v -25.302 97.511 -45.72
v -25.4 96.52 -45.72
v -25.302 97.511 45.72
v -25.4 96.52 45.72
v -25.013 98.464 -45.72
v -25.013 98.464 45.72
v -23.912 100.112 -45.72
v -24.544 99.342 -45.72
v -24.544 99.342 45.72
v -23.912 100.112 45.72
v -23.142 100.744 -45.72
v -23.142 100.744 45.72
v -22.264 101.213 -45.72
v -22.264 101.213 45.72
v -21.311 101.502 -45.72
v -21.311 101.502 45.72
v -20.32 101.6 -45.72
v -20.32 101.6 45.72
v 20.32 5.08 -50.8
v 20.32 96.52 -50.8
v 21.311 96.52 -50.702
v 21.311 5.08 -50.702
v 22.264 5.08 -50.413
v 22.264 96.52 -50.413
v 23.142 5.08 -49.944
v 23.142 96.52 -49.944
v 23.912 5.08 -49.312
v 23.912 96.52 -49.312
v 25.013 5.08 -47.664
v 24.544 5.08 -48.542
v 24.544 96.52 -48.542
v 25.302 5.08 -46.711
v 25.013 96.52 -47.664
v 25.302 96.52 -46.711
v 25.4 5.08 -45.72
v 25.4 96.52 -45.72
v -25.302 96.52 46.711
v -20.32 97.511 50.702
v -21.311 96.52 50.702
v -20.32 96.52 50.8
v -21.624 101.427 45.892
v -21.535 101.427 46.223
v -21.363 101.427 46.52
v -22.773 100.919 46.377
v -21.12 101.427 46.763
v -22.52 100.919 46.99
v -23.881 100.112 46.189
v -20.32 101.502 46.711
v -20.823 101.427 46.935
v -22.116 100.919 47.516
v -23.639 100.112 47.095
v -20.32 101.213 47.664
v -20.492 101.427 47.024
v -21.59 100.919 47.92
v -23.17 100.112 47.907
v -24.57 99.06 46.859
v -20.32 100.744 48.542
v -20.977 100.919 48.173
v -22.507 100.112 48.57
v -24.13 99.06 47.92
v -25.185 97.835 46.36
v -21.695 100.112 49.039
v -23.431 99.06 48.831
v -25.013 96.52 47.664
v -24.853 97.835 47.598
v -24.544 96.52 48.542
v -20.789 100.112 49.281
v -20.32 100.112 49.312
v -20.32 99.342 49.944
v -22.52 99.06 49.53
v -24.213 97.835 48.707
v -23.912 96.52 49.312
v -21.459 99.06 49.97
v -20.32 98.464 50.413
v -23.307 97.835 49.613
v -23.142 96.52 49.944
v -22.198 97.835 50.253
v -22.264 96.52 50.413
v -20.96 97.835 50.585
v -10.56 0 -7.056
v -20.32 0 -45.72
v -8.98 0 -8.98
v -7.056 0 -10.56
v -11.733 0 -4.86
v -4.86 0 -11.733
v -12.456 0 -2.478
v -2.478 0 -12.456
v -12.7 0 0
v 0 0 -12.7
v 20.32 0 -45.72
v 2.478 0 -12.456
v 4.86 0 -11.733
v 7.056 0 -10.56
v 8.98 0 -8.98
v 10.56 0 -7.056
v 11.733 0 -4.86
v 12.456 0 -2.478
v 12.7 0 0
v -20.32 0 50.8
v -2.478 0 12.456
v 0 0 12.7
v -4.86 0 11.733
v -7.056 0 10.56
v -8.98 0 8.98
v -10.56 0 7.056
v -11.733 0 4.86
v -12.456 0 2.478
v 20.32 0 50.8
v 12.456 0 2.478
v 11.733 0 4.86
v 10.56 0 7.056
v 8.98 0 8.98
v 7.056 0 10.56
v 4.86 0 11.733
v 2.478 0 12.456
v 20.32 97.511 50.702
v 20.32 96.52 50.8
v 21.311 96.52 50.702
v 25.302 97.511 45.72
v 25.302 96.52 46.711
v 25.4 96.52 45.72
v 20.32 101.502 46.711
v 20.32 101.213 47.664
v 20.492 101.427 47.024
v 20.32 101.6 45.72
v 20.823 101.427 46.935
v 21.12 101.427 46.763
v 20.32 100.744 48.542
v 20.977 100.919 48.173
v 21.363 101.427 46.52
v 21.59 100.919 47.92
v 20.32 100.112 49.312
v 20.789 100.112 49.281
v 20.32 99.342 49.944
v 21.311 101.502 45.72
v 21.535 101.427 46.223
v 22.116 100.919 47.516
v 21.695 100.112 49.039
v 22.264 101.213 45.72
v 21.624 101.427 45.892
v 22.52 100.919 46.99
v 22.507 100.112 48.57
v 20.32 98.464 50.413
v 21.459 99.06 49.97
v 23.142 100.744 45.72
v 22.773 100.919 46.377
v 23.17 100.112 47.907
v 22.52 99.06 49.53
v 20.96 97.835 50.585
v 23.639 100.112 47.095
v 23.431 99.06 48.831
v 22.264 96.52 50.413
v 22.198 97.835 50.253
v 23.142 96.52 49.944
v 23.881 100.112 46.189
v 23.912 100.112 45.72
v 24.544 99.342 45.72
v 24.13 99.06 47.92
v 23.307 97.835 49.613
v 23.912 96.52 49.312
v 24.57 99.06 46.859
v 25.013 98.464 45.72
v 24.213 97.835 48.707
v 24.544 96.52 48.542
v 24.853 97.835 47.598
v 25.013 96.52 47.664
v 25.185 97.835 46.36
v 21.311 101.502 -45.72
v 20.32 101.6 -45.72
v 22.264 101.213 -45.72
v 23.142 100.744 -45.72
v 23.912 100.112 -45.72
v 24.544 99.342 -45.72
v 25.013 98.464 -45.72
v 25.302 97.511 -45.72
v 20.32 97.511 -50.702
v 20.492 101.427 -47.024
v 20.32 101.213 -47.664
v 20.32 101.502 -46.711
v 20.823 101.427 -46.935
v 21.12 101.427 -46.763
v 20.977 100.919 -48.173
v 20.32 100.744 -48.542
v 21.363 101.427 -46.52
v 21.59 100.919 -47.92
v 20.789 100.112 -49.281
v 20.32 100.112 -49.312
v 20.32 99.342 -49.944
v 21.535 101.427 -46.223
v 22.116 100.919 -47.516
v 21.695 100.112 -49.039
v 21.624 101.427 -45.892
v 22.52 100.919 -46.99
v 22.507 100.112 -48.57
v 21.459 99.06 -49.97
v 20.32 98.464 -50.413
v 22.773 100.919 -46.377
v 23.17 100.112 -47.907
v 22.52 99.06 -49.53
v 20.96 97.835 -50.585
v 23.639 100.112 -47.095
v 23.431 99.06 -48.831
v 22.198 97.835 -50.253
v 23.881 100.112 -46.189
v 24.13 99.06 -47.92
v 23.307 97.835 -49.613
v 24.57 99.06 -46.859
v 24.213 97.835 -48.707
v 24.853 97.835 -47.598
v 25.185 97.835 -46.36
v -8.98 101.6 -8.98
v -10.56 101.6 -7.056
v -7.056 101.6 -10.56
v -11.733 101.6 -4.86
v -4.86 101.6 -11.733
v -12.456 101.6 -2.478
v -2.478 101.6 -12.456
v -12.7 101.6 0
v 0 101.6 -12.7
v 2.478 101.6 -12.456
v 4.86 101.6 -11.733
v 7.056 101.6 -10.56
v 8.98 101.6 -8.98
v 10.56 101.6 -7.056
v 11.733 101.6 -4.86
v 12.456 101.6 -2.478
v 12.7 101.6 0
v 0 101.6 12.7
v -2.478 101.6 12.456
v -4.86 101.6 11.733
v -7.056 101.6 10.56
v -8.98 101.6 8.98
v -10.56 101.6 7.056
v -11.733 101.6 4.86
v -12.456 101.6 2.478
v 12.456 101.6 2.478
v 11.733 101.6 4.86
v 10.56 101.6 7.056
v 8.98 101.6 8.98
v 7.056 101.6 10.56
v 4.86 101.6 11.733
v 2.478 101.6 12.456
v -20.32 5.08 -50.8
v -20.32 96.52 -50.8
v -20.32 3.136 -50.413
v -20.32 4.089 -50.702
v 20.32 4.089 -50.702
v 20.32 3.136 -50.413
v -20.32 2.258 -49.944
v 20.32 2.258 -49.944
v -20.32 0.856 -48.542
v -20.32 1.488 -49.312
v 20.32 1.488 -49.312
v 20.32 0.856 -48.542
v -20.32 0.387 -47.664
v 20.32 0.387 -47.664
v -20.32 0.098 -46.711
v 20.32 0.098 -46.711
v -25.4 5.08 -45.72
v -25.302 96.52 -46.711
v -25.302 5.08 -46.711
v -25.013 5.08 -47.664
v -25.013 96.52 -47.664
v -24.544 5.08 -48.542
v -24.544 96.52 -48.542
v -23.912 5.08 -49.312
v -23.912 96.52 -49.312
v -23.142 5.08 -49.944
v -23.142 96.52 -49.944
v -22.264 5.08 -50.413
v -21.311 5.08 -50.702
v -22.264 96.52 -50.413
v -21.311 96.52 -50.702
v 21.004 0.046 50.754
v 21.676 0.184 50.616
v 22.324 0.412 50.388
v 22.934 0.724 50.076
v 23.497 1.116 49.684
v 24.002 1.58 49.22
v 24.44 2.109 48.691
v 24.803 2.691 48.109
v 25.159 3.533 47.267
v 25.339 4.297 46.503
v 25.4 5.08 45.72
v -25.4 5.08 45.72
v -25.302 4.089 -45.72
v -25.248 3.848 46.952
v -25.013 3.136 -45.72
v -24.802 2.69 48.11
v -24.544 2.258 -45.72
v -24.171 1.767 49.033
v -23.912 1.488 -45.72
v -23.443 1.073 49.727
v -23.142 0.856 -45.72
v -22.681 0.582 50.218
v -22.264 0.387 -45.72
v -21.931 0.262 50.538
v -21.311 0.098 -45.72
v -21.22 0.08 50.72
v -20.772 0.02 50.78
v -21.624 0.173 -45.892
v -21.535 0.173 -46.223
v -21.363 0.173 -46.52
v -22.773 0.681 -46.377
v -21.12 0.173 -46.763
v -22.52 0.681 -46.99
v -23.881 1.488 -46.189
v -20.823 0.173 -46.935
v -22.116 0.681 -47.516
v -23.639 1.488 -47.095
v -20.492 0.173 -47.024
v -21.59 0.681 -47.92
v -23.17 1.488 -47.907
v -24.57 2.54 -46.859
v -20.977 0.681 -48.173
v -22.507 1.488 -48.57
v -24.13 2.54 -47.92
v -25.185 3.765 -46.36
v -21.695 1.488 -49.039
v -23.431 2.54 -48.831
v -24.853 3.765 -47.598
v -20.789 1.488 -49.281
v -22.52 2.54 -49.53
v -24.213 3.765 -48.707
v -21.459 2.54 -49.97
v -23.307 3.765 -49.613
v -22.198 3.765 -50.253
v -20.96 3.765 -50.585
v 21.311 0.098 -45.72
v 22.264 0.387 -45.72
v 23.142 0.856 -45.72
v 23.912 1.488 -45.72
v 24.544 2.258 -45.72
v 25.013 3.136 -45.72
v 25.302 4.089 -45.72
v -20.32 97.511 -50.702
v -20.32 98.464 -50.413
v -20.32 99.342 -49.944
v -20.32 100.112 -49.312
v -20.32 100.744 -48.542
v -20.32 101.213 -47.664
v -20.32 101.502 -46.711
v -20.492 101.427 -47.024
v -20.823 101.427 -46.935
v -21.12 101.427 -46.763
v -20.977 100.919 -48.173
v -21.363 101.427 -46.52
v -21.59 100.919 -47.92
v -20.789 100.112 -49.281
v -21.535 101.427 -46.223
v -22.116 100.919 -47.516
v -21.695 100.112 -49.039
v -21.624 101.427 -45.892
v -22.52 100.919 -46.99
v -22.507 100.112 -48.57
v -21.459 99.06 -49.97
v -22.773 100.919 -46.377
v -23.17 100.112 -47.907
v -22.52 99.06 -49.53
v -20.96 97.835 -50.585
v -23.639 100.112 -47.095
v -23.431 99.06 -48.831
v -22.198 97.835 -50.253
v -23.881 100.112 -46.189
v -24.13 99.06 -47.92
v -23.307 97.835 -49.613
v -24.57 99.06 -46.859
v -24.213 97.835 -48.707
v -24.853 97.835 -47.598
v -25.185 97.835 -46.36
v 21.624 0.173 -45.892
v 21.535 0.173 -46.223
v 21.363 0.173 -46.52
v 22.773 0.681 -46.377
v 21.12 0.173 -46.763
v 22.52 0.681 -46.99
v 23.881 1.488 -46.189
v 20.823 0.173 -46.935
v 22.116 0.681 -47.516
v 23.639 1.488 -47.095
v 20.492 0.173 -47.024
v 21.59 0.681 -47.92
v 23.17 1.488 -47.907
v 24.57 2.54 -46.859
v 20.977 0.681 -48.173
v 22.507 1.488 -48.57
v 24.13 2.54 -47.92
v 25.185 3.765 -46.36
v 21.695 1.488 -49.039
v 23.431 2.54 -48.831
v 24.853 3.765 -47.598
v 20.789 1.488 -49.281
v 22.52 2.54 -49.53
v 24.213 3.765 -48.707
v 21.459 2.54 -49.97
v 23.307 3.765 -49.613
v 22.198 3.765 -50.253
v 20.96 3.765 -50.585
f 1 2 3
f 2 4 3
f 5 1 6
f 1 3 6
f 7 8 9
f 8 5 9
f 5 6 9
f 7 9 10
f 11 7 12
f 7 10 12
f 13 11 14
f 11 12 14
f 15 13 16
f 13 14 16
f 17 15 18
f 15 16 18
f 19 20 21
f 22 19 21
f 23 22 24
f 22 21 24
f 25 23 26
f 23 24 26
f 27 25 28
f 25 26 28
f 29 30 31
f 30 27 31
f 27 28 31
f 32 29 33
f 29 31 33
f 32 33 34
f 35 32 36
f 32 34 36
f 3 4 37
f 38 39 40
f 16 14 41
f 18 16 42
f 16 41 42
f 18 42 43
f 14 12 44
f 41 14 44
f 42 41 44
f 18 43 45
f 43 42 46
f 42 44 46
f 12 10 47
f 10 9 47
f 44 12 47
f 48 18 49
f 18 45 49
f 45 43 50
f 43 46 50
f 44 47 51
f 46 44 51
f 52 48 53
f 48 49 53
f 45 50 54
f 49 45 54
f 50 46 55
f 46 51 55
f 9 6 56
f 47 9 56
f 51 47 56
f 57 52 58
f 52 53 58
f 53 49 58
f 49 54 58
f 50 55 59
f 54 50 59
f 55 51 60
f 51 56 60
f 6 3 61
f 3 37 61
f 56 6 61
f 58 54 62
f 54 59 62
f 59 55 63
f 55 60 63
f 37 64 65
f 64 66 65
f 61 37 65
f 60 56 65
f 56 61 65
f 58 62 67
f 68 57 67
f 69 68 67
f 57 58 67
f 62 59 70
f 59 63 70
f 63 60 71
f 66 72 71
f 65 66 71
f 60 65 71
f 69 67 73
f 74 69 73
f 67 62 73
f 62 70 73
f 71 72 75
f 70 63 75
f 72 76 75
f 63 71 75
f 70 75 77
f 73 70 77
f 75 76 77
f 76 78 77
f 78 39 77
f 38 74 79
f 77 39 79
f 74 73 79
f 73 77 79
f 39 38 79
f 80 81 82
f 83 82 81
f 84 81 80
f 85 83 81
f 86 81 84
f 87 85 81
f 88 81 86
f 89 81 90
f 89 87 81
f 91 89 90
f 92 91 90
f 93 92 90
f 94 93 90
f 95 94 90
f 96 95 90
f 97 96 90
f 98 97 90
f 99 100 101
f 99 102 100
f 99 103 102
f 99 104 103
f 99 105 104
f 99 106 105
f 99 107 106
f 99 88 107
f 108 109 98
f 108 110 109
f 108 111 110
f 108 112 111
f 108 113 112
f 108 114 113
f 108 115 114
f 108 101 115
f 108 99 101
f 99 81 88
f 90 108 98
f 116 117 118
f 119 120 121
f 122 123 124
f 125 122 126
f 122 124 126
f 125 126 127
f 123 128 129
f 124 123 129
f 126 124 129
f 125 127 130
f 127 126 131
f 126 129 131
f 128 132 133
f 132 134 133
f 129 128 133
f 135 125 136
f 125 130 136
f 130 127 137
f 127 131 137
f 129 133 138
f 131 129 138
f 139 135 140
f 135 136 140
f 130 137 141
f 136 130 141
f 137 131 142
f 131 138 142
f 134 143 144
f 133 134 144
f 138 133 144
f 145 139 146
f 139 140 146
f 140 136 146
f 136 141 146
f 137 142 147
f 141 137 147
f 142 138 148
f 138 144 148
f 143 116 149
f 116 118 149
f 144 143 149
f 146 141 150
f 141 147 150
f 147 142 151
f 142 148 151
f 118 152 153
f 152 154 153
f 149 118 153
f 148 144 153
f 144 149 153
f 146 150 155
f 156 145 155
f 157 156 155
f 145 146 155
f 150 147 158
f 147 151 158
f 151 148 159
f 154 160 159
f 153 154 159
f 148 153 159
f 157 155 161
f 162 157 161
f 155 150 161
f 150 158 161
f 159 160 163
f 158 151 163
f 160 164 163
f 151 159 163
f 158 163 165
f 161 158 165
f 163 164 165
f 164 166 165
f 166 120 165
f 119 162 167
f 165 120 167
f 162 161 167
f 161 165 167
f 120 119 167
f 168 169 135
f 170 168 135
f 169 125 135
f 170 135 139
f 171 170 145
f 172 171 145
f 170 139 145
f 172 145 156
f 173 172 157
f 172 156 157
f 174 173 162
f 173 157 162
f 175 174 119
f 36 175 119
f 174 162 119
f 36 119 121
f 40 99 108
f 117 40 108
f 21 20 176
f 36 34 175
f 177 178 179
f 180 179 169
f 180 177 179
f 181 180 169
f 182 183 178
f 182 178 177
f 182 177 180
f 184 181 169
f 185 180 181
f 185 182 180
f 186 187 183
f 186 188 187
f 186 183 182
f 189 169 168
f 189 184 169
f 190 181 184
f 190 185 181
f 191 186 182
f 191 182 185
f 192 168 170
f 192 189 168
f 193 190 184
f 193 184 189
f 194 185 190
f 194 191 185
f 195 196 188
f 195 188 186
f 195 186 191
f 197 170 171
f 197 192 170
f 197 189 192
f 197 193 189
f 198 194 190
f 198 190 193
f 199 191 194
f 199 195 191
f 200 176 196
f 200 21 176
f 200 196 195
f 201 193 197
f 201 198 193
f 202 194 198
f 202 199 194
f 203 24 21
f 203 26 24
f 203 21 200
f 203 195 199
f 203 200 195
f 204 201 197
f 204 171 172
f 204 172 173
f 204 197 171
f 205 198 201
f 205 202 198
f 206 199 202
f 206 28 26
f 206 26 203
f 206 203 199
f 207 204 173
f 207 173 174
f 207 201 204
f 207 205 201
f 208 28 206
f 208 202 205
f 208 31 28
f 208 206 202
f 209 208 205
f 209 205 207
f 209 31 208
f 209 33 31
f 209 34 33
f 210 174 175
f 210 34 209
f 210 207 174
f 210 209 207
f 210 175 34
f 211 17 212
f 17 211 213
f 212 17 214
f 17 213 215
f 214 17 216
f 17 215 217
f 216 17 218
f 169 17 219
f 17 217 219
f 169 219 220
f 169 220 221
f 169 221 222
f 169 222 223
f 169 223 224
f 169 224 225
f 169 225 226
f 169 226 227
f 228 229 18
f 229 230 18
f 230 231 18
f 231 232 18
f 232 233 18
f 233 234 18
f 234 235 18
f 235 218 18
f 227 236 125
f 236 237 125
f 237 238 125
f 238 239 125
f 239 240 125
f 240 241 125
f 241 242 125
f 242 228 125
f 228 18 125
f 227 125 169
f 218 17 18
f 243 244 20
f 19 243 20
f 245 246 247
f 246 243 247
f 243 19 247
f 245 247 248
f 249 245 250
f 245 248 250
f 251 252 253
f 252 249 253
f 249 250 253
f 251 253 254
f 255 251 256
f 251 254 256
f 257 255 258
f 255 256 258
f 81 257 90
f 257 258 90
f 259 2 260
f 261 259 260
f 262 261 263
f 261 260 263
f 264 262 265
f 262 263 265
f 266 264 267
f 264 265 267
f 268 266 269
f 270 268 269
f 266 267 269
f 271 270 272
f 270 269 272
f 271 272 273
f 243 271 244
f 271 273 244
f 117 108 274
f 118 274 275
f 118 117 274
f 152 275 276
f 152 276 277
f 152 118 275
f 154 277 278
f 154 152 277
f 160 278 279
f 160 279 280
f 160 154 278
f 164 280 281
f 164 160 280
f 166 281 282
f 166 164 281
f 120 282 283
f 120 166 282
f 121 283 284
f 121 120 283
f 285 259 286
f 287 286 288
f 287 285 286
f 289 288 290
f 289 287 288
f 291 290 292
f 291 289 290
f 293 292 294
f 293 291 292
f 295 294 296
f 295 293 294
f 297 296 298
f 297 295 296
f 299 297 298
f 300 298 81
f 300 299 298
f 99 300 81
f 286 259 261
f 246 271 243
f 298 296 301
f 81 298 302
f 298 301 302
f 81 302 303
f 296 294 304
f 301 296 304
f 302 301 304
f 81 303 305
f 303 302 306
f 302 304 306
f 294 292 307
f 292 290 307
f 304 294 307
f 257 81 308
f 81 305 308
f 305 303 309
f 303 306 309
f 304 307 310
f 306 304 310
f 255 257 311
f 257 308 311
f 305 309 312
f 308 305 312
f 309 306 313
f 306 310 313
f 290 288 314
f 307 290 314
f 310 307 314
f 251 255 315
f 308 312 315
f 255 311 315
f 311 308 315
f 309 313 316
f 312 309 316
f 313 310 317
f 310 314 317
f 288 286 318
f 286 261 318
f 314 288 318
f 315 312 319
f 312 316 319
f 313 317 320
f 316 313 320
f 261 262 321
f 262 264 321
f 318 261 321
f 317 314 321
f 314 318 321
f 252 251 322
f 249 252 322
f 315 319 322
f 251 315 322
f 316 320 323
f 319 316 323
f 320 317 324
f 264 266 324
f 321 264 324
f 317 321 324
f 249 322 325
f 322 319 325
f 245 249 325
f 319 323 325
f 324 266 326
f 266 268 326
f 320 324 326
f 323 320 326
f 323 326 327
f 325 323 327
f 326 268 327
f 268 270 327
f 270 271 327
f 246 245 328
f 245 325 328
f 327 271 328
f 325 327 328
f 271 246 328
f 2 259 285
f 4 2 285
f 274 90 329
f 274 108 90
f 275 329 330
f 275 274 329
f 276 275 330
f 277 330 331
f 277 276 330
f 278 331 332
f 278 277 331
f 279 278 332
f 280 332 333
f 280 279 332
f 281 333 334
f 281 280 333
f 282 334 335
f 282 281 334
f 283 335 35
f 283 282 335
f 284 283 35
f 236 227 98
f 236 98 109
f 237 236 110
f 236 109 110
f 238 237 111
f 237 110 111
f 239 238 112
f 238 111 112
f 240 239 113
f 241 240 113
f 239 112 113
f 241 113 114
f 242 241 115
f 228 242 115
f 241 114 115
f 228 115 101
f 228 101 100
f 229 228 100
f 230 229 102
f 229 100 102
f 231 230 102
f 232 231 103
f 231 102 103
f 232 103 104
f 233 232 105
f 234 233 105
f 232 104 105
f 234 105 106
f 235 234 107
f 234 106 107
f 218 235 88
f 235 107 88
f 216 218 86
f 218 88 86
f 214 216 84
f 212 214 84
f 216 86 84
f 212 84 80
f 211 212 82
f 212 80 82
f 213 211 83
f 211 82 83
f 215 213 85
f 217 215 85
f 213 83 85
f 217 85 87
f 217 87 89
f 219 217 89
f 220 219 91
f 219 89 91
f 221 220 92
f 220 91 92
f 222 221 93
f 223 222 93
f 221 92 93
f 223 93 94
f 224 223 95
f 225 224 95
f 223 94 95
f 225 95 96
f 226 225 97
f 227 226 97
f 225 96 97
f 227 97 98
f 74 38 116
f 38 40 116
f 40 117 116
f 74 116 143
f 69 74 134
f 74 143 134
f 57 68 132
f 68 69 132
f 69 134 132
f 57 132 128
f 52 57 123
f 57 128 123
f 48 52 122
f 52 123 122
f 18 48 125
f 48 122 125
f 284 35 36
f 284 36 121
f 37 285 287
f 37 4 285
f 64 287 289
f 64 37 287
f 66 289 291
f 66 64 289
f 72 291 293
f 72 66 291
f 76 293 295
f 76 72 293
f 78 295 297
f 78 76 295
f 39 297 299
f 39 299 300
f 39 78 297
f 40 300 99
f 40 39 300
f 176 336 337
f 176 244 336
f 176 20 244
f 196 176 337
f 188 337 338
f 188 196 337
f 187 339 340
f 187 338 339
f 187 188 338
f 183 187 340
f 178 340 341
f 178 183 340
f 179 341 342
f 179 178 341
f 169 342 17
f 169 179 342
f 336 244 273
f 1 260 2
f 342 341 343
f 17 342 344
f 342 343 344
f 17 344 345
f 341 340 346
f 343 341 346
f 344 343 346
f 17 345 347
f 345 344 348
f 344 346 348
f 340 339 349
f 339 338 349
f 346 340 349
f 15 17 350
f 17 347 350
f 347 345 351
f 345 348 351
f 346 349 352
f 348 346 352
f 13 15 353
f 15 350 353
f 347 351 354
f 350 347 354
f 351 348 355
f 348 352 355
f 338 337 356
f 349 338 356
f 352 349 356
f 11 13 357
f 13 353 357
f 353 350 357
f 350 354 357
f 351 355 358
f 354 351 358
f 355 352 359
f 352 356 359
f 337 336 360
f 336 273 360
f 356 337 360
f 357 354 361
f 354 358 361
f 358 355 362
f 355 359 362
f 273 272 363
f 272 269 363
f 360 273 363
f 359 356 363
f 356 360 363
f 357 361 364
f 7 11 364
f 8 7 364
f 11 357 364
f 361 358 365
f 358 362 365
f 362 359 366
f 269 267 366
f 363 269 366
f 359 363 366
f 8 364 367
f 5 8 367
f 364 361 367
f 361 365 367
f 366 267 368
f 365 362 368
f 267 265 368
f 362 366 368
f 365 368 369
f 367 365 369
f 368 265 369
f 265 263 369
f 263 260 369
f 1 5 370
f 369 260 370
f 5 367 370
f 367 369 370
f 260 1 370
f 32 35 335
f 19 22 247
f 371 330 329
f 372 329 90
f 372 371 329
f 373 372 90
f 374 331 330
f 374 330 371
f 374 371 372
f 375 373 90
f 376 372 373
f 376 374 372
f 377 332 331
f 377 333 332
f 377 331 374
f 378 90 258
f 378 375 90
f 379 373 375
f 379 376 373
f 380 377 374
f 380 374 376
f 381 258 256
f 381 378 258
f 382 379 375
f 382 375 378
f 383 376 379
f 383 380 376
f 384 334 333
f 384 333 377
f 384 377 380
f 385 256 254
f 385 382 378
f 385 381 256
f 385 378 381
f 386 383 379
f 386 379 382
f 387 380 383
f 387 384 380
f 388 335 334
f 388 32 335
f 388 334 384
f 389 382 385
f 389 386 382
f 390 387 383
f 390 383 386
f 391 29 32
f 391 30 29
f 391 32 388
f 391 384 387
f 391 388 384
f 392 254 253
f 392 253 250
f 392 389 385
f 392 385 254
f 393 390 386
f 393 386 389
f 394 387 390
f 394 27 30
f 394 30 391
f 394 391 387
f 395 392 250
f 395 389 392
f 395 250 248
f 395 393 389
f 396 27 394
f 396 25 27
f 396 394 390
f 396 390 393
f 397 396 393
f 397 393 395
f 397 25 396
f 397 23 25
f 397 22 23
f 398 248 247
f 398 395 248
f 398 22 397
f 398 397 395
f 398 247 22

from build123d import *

# Parameters (mm, degrees)
F0_W     = 50.8
F0_H     = 101.6
F1_DEPTH = 101.6
F2_R     = 12.7
F3_DEPTH = 101.6
F4_R     = 5.08


with BuildPart() as f1:
    # F0 (on Front) → F1 (new body)
    with BuildSketch(Plane.XZ):
        Rectangle(F0_W, F0_H)
    extrude(amount=-F1_DEPTH)

    # F2 (on Front) → F3 (cut, through all)
    with BuildSketch(Plane.XZ):
        Circle(F2_R)
    extrude(amount=-F3_DEPTH, mode=Mode.SUBTRACT)

    # F4
    f4_edges = [f1.edges().sort_by_distance(p)[0] for p in [
        (25.4, 50.8, 50.8),
        (-25.4, 50.8, 50.8),
        (25.4, 50.8, -50.8),
        (-25.4, 50.8, -50.8),
        (0, 101.6, -50.8),
        (-25.4, 101.6, 0),
        (0, 101.6, 50.8),
        (25.4, 101.6, 0),
        (25.4, 0, 0),
        (-25.4, 0, 0),
        (0, 0, -50.8),
    ]]
    fillet(f4_edges, radius=F4_R)


solid = f1.part
